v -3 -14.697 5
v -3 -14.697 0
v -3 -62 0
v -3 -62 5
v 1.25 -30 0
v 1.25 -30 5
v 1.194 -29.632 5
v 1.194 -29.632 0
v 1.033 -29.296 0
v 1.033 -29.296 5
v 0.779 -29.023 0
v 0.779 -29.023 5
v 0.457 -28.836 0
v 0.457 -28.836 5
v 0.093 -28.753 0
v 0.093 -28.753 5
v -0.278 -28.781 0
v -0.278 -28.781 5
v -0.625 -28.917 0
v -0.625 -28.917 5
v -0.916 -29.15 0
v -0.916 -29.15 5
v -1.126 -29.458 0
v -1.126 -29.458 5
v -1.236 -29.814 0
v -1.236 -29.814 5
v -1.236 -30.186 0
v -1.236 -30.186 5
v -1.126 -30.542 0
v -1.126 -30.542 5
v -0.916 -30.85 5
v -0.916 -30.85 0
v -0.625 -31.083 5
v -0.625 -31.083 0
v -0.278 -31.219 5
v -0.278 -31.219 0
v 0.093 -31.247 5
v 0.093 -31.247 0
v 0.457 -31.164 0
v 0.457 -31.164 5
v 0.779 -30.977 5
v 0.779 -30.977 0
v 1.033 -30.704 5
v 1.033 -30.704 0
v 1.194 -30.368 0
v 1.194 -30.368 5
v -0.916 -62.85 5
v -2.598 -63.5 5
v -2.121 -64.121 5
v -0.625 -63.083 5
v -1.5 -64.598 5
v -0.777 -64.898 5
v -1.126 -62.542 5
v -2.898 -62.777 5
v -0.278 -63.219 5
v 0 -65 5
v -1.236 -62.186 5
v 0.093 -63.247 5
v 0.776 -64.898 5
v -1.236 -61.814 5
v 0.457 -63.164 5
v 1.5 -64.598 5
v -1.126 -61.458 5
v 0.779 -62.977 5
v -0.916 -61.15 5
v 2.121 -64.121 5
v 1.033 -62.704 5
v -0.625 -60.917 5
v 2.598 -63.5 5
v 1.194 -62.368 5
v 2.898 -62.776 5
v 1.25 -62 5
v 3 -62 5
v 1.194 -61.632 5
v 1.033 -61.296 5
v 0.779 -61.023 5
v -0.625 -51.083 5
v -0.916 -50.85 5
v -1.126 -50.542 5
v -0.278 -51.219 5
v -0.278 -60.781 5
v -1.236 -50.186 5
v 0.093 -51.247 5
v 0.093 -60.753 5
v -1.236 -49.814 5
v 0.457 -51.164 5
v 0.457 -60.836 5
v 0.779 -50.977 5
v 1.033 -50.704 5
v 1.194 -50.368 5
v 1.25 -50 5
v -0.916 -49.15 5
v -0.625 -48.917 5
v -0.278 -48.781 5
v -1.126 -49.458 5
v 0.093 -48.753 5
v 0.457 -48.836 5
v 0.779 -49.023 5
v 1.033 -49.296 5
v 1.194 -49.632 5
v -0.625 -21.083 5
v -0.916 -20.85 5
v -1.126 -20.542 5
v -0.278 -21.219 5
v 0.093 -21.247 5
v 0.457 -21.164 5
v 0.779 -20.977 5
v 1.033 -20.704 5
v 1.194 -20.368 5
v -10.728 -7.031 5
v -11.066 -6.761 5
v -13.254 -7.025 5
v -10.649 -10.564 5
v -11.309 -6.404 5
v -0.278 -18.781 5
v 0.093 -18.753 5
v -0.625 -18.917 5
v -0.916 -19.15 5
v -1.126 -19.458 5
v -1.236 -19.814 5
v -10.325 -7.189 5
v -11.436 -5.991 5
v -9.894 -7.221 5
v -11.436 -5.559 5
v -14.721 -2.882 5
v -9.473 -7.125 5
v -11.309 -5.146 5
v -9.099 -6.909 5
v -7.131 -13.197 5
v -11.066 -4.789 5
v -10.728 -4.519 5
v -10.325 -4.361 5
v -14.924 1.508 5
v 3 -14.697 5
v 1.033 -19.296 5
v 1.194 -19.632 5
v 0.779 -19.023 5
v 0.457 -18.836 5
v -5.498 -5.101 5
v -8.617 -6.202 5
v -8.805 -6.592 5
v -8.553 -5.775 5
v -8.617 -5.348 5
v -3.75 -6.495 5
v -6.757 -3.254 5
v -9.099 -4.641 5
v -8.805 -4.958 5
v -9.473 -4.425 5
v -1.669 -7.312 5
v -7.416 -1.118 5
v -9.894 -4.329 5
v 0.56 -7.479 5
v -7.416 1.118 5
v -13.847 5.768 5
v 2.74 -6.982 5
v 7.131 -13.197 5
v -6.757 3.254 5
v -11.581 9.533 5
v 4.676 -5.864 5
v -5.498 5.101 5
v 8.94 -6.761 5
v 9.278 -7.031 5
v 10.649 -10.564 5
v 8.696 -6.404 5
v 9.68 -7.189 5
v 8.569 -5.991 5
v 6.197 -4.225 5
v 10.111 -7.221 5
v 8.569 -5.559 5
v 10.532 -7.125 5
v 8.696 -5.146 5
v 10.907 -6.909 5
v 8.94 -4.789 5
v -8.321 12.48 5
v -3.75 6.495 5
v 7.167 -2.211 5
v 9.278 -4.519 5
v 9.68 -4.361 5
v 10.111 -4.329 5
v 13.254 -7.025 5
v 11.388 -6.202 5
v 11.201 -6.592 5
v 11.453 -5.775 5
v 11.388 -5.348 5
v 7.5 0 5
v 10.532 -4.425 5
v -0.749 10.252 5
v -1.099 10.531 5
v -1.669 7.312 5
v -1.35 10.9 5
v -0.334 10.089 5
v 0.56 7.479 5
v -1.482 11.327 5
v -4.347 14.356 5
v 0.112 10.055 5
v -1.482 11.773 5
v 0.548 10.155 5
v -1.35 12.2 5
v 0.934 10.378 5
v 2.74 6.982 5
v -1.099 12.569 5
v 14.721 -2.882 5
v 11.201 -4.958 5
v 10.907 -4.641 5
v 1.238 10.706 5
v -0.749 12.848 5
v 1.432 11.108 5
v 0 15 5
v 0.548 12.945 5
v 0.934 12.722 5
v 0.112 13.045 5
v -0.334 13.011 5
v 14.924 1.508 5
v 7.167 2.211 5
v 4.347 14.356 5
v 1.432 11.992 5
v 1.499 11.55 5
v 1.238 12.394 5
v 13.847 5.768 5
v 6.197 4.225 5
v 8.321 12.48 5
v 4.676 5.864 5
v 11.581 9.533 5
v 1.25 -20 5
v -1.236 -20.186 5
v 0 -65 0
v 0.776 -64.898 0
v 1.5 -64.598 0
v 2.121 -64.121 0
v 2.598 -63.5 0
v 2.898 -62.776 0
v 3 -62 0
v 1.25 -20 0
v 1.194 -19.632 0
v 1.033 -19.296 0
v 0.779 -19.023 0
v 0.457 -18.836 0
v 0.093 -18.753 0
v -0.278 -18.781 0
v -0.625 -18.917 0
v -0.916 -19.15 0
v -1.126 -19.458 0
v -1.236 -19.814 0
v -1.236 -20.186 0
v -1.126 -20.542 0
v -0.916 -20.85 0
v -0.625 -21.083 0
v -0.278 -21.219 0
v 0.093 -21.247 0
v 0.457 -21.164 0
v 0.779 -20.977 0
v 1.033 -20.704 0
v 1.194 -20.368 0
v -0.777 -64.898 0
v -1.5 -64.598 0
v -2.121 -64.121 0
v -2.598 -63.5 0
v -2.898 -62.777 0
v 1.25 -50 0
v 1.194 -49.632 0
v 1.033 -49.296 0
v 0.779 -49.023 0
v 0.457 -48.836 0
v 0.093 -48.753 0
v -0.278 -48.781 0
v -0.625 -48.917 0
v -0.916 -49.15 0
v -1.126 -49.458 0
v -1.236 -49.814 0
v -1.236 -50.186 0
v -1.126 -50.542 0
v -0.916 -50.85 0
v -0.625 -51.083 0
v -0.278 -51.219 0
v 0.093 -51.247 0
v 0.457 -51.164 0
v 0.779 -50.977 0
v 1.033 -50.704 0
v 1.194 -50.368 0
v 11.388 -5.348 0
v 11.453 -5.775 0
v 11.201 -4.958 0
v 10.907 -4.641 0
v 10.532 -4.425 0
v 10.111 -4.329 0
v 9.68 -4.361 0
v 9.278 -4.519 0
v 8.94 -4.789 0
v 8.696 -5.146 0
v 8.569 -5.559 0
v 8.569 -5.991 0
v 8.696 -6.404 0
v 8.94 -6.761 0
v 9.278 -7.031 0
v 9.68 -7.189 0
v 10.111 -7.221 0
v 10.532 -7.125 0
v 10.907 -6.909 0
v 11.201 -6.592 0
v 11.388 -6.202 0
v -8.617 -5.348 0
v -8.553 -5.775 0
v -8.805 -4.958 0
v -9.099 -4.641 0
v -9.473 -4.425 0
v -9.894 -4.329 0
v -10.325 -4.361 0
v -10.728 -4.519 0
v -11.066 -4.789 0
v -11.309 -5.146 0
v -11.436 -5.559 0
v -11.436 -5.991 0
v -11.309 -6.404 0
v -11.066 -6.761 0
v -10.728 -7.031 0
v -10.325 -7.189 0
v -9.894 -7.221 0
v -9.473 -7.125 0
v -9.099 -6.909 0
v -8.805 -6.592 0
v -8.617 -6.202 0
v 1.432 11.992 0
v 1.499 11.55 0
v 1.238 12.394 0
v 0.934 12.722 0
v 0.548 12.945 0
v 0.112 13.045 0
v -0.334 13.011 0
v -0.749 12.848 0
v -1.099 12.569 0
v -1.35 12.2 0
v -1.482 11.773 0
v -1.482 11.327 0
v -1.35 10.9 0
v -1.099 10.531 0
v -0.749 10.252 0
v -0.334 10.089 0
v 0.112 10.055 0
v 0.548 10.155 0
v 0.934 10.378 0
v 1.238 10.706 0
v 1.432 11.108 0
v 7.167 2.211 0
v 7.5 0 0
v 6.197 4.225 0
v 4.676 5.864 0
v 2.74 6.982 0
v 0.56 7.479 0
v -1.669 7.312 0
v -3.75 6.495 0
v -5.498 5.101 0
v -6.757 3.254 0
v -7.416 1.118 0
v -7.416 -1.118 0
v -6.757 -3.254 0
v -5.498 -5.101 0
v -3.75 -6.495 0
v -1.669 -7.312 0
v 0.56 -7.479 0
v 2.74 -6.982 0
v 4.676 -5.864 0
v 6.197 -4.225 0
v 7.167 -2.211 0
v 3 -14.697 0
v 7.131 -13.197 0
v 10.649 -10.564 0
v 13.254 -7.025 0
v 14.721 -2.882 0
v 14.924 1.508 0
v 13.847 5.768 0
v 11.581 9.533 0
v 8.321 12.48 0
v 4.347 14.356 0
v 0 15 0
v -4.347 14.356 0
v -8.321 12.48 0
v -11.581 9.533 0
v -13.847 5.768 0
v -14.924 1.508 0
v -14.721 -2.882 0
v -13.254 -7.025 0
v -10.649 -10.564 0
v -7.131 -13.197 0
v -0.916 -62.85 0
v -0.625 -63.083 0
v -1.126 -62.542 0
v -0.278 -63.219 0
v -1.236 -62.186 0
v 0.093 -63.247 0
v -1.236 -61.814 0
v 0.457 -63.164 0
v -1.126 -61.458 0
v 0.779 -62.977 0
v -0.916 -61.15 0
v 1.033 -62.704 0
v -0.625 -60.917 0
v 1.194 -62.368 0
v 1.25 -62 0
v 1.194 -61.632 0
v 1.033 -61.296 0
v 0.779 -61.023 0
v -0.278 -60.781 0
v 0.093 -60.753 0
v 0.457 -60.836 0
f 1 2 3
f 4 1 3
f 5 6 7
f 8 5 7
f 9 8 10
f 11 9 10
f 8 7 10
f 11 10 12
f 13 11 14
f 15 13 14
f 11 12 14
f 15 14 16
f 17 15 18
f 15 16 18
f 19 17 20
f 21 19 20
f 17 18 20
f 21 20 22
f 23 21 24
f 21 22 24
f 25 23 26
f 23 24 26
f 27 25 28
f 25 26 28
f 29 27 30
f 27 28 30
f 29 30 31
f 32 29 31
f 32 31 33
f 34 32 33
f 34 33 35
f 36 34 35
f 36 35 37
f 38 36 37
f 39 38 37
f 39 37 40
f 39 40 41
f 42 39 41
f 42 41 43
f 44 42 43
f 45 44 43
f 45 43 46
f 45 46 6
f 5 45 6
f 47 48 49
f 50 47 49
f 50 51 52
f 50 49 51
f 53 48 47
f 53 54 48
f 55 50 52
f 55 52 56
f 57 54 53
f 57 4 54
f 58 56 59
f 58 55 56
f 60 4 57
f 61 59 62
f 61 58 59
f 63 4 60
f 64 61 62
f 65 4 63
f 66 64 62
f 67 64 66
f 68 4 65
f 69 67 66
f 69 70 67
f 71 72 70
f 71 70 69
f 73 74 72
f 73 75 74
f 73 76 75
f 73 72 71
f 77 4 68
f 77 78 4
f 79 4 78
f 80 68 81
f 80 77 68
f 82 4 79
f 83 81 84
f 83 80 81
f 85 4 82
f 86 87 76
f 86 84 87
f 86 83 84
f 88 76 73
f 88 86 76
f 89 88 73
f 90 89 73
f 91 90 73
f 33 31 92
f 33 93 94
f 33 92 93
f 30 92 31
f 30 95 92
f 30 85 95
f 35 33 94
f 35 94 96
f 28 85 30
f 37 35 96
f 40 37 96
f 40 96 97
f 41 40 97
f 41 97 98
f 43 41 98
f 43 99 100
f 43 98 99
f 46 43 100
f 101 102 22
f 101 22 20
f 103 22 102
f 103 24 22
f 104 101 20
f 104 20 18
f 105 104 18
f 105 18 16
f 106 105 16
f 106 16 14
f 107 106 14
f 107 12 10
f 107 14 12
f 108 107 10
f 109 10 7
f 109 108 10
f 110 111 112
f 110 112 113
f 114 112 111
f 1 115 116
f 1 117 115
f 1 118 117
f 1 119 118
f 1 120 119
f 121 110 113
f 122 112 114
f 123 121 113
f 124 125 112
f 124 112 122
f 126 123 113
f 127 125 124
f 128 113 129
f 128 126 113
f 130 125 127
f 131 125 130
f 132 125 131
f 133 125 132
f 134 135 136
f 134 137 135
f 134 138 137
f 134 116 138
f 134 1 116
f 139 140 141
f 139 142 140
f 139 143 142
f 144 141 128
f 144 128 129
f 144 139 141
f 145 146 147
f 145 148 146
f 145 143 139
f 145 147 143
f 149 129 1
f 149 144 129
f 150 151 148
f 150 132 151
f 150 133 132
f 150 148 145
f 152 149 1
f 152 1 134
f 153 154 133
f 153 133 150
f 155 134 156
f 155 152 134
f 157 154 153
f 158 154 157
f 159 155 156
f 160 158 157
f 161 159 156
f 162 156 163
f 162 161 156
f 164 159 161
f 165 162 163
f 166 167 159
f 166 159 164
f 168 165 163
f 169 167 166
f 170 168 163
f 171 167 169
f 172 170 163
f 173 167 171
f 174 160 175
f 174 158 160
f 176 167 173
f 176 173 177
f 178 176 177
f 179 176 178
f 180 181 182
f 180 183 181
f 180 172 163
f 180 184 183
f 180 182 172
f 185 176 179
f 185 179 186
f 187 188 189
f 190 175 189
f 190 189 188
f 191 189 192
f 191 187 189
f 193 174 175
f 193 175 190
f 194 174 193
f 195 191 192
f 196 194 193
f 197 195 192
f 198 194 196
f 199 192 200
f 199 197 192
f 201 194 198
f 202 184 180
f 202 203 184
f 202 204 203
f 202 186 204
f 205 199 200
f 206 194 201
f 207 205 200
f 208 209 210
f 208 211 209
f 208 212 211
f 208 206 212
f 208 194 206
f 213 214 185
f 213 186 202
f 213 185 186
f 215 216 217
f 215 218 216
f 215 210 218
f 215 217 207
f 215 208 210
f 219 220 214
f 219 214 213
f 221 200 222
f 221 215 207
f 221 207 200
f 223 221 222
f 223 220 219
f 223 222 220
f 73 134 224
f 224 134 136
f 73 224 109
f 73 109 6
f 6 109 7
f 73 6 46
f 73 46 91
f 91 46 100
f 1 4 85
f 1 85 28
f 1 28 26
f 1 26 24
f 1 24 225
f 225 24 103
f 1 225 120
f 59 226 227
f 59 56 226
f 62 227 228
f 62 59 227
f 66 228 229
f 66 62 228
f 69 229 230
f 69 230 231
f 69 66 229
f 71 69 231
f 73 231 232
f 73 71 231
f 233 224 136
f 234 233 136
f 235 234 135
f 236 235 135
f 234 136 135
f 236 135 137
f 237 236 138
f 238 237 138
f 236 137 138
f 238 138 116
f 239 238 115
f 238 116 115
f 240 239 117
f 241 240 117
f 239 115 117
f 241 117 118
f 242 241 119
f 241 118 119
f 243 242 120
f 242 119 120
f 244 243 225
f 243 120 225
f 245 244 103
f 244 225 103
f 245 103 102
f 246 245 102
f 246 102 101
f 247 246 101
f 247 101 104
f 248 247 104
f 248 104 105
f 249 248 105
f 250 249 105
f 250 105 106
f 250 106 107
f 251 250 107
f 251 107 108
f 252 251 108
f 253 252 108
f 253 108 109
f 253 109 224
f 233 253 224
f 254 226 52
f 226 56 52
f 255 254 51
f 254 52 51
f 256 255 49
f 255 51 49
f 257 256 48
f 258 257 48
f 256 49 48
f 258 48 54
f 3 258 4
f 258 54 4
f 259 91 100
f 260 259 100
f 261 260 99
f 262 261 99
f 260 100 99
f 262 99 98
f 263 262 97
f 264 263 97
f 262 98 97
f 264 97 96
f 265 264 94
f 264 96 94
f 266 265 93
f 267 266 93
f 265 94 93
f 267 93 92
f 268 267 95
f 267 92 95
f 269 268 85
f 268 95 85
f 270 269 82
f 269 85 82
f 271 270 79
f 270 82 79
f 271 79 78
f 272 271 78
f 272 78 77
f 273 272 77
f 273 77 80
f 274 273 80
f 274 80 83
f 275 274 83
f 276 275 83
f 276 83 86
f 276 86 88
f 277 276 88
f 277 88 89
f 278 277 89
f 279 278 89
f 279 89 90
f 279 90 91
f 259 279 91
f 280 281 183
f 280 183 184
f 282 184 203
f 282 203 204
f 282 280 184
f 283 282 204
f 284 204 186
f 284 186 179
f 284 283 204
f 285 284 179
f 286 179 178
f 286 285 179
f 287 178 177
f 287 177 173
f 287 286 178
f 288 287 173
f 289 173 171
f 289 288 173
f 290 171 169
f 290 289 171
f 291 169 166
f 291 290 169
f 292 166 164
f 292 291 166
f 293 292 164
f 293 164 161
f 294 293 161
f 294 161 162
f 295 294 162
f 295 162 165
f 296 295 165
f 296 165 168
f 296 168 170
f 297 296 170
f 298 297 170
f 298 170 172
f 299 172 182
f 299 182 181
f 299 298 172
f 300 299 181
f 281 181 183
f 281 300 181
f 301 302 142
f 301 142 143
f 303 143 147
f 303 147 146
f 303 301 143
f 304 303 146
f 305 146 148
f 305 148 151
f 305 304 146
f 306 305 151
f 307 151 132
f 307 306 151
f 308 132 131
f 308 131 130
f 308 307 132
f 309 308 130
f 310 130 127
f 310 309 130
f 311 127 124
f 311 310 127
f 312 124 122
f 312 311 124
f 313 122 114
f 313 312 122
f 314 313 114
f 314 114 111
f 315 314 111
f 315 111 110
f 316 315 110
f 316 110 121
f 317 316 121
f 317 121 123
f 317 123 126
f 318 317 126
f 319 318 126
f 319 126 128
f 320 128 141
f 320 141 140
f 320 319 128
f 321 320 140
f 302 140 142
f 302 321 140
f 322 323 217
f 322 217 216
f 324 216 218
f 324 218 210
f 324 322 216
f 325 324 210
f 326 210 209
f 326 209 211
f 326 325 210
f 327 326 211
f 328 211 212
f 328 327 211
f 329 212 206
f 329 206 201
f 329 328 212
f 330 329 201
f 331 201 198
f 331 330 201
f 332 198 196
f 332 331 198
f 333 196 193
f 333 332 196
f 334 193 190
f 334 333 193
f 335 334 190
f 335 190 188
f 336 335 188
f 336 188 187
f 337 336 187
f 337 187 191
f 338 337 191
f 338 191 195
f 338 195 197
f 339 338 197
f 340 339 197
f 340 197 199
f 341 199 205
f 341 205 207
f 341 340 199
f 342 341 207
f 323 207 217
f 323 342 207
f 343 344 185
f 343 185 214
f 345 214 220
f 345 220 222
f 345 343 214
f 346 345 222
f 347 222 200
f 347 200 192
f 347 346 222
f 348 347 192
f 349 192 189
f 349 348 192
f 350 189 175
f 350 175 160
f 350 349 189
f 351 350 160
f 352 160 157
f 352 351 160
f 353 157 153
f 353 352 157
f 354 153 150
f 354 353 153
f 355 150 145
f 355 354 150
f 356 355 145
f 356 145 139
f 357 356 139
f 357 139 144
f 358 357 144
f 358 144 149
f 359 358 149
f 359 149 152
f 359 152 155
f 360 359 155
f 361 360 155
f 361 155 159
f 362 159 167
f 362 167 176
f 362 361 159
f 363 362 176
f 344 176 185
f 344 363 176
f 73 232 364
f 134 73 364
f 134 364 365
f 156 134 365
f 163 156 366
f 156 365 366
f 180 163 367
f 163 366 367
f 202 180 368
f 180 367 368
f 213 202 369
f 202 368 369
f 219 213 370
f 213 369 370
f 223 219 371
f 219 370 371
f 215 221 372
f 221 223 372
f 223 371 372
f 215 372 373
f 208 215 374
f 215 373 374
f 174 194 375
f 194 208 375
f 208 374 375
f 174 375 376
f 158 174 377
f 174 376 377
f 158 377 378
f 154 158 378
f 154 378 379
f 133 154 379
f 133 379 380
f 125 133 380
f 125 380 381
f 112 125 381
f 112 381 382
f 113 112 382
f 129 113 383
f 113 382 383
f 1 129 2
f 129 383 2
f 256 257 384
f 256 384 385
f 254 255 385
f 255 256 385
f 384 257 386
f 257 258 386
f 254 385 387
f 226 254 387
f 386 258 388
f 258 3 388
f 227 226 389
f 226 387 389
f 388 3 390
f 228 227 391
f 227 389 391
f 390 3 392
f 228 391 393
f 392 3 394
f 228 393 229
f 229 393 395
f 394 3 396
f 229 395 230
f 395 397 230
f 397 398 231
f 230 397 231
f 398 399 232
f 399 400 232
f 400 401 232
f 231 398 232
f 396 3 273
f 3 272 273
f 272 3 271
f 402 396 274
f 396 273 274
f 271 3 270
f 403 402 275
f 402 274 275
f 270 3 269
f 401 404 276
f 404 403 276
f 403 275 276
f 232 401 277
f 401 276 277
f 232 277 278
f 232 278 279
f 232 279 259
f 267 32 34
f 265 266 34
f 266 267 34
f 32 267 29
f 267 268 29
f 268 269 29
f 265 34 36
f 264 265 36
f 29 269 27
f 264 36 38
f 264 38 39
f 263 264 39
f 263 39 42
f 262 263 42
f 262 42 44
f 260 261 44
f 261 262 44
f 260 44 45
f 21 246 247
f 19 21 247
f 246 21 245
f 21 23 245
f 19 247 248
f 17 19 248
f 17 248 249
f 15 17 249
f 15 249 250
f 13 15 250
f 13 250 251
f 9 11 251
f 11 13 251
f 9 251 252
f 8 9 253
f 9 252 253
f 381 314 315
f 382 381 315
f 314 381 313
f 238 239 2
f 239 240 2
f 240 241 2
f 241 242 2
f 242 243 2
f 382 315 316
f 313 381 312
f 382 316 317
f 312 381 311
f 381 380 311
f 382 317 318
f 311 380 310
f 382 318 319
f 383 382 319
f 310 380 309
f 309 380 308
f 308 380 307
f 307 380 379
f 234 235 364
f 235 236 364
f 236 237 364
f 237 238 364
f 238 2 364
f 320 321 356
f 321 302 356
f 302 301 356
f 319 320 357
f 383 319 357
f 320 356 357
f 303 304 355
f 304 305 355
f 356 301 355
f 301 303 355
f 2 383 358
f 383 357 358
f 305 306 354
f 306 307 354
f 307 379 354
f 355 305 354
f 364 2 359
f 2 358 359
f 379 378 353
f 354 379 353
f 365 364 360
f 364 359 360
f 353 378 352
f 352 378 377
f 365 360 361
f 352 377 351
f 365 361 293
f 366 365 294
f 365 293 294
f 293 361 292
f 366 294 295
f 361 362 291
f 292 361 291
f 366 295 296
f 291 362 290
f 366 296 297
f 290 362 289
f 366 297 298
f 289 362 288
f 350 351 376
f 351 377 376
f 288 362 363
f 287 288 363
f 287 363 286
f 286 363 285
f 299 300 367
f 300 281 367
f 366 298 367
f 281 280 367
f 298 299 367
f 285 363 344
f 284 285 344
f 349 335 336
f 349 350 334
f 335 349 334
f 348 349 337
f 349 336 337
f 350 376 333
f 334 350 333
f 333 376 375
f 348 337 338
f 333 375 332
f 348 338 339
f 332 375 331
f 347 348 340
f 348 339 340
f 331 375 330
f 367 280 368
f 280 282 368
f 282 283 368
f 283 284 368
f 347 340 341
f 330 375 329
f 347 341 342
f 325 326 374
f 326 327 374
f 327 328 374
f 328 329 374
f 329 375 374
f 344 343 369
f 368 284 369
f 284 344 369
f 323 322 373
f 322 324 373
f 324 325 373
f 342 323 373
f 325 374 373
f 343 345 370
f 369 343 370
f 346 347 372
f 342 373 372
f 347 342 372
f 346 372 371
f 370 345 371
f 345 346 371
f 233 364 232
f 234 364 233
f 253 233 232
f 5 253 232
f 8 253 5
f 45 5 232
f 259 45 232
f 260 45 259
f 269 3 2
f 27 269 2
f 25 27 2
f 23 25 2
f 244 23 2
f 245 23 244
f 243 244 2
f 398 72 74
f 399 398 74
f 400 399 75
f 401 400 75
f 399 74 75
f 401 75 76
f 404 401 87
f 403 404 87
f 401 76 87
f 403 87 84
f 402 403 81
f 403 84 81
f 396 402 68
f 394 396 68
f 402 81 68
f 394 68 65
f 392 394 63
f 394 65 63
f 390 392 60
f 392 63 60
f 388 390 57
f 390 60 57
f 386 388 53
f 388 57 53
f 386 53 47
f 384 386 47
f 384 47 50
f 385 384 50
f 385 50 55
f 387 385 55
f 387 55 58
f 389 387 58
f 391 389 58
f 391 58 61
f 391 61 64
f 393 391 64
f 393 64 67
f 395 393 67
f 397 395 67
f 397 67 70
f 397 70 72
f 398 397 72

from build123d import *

# Parameters (mm, degrees)
ESQUISSE1_R             = 15
ESQUISSE1_R_2           = 1.45
ESQUISSE1_R_3           = 1.498803823
ESQUISSE1_R_4           = 7.5
BOSS_EXTRU_1_DEPTH      = 5
CONG_1_R                = 3
CONG_2_R                = 3
ENL_V_MAT_EXTRU_1_REACH = 68.895
ESQUISSE2_R             = 1.25


with BuildPart() as part:
    # Esquisse1 → Boss.-Extru.1 (new body)
    # profile 1 of 3: a face of its own
    with BuildSketch(Plane.XY):
        with BuildLine():
            ThreePointArc((3, -14.696938457), (1.50763443, -14.924042295), (0, -15))
            Line((0, -15), (0, -65))
            Line((0, -65), (3, -65))
            Line((3, -65), (3, -14.696938457))
        make_face()
    # profile 2 of 3: a face of its own
    with BuildSketch(Plane.XY):
        with BuildLine():
            Line((0, -65), (0, -15))
            ThreePointArc((0, -15), (-1.50763443, -14.924042295), (-3, -14.696938457))
            Line((-3, -14.696938457), (-3, -65))
            Line((-3, -65), (0, -65))
        make_face()
    # profile 3 of 3: a face of its own
    with BuildSketch(Plane.XY):
        Circle(ESQUISSE1_R)
        with Locations((10.002593414, -5.775)):
            Circle(ESQUISSE1_R_2, mode=Mode.SUBTRACT)
        with Locations((0, 11.55)):
            Circle(ESQUISSE1_R_3, mode=Mode.SUBTRACT)
        with Locations((-10.002593414, -5.775)):
            Circle(ESQUISSE1_R_2, mode=Mode.SUBTRACT)
        Circle(ESQUISSE1_R_4, mode=Mode.SUBTRACT)
    extrude(amount=BOSS_EXTRU_1_DEPTH)

    # Congé1
    cong_1_edges = [part.edges().sort_by_distance(p)[0] for p in [
        (3, -65, 2.5),
    ]]
    fillet(cong_1_edges, radius=CONG_1_R)

    # Congé2
    cong_2_edges = [part.edges().sort_by_distance(p)[0] for p in [
        (-3, -65, 2.5),
    ]]
    fillet(cong_2_edges, radius=CONG_2_R - 0.0001)  # a hair under: the kernel refuses the full size

    # Esquisse2 → Enlèv. mat.-Extru.1 (cut, up to next)
    with BuildSketch(Plane.XY.offset(5), mode=Mode.PRIVATE) as enl_v_mat_extru_1_sk1:
        with Locations((0, -20)):
            Circle(ESQUISSE2_R)
    enl_v_mat_extru_1_tool1 = extrude(enl_v_mat_extru_1_sk1.sketch, amount=-ENL_V_MAT_EXTRU_1_REACH, mode=Mode.PRIVATE) & part.part
    # Esquisse2 → Enlèv. mat.-Extru.1 (cut, up to next)
    with BuildSketch(Plane.XY.offset(5), mode=Mode.PRIVATE) as enl_v_mat_extru_1_sk2:
        with Locations((0, -30)):
            Circle(ESQUISSE2_R)
    enl_v_mat_extru_1_tool2 = extrude(enl_v_mat_extru_1_sk2.sketch, amount=-ENL_V_MAT_EXTRU_1_REACH, mode=Mode.PRIVATE) & part.part
    # Esquisse2 → Enlèv. mat.-Extru.1 (cut, up to next)
    with BuildSketch(Plane.XY.offset(5), mode=Mode.PRIVATE) as enl_v_mat_extru_1_sk3:
        with Locations((0, -50)):
            Circle(ESQUISSE2_R)
    enl_v_mat_extru_1_tool3 = extrude(enl_v_mat_extru_1_sk3.sketch, amount=-ENL_V_MAT_EXTRU_1_REACH, mode=Mode.PRIVATE) & part.part
    # Esquisse2 → Enlèv. mat.-Extru.1 (cut, up to next)
    with BuildSketch(Plane.XY.offset(5), mode=Mode.PRIVATE) as enl_v_mat_extru_1_sk4:
        with Locations((0, -62)):
            Circle(ESQUISSE2_R)
    enl_v_mat_extru_1_tool4 = extrude(enl_v_mat_extru_1_sk4.sketch, amount=-ENL_V_MAT_EXTRU_1_REACH, mode=Mode.PRIVATE) & part.part
    add(enl_v_mat_extru_1_tool1.solids().sort_by_distance((0, -20, 5))[0], mode=Mode.SUBTRACT)
    add(enl_v_mat_extru_1_tool2.solids().sort_by_distance((0, -30, 5))[0], mode=Mode.SUBTRACT)
    add(enl_v_mat_extru_1_tool3.solids().sort_by_distance((0, -50, 5))[0], mode=Mode.SUBTRACT)
    add(enl_v_mat_extru_1_tool4.solids().sort_by_distance((0, -62, 5))[0], mode=Mode.SUBTRACT)


solid = part.part
